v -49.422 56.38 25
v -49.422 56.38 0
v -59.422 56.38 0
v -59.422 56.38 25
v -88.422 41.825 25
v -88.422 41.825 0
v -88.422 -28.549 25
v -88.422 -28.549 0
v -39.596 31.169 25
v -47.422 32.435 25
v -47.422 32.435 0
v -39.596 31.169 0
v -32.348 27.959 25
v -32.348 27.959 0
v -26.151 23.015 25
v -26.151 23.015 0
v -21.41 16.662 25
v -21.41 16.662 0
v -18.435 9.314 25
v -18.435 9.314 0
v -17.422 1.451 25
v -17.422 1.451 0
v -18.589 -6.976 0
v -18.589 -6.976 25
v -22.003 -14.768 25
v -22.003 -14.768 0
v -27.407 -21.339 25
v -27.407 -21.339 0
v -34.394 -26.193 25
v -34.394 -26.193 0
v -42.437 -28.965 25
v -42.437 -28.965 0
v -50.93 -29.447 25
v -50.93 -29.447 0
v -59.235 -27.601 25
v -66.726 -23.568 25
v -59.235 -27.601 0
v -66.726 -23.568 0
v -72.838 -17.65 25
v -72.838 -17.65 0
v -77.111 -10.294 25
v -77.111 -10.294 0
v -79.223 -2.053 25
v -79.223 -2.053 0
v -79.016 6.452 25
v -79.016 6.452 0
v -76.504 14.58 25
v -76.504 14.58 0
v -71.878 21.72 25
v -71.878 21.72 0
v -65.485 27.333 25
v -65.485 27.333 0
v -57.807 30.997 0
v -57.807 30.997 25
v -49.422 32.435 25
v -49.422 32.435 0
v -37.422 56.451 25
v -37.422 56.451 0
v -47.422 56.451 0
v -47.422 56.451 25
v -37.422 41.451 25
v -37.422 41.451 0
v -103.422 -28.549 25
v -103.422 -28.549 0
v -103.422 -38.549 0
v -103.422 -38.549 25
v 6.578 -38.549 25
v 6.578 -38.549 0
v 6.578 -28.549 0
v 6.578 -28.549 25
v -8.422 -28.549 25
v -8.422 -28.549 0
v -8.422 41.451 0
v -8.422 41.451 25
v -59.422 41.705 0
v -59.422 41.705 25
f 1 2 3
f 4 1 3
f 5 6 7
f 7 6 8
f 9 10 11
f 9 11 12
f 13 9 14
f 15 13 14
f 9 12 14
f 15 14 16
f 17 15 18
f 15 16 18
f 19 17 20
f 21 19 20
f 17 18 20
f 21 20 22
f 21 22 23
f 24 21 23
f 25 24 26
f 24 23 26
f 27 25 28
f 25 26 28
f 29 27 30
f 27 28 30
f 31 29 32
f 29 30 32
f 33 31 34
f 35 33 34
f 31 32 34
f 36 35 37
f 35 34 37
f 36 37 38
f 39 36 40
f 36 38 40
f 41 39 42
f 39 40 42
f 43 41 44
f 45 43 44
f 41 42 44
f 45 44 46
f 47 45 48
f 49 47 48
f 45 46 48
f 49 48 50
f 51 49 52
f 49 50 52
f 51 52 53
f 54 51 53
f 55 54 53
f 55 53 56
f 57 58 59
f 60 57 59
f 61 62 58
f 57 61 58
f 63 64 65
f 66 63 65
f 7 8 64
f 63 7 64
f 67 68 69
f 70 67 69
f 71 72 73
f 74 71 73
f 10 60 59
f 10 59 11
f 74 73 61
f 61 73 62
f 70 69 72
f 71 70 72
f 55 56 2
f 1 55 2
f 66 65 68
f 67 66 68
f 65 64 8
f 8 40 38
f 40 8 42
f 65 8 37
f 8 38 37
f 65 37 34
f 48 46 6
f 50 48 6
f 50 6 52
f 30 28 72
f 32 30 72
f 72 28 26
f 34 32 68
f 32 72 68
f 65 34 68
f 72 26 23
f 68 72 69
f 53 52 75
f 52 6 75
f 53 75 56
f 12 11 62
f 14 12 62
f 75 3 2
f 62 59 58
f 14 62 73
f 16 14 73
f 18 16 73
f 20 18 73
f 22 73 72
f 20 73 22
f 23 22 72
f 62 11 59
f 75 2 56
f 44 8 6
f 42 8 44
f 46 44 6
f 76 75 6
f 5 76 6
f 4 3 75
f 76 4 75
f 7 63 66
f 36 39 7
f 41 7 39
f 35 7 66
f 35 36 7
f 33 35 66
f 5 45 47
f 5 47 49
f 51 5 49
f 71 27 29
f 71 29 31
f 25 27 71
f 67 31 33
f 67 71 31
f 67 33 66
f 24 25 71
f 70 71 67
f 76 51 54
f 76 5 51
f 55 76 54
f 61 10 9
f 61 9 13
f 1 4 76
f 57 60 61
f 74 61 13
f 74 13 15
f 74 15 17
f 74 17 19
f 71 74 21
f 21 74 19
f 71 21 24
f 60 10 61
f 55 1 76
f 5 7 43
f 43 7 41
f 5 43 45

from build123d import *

# Parameters (mm, degrees)
SALIENTE_EXTRUIR5_DEPTH = 25


with BuildPart() as part:
    # Croquis1 → Saliente-Extruir5 (new body)
    with BuildSketch(Plane.XY):
        with BuildLine():
            Line((-103.421749263, -28.548605363), (-103.421749263, -38.548605363))
            Line((-103.421749263, -38.548605363), (6.578250737, -38.548605363))
            Line((6.578250737, -38.548605363), (6.578250737, -28.548605363))
            Line((6.578250737, -28.548605363), (-8.421749263, -28.548605363))
            Line((-8.421749263, -28.548605363), (-8.421749263, 41.451394637))
            Line((-8.421749263, 41.451394637), (-37.421749263, 41.451394637))
            Line((-37.421749263, 41.451394637), (-37.421749263, 56.451394637))
            Line((-37.421749263, 56.451394637), (-47.421749263, 56.451394637))
            Line((-47.421749263, 56.451394637), (-47.421749263, 32.435261406))
            ThreePointArc((-47.421749263, 32.435261406), (-26.150691812, 23.015253289), (-17.421749263, 1.451394637))
            ThreePointArc((-17.421749263, 1.451394637), (-69.985607916, -20.819662815), (-49.421749263, 32.435261406))
            Line((-49.421749263, 32.435261406), (-49.421749263, 56.380232155))
            Line((-49.421749263, 56.380232155), (-59.421749263, 56.380232155))
            Line((-59.421749263, 56.380232155), (-59.421749263, 41.704732865))
            Line((-59.421749263, 41.704732865), (-88.421749263, 41.824609442))
            Line((-88.421749263, 41.824609442), (-88.421749263, -28.548605363))
            Line((-88.421749263, -28.548605363), (-103.421749263, -28.548605363))
        make_face()
    extrude(amount=SALIENTE_EXTRUIR5_DEPTH)


solid = part.part
